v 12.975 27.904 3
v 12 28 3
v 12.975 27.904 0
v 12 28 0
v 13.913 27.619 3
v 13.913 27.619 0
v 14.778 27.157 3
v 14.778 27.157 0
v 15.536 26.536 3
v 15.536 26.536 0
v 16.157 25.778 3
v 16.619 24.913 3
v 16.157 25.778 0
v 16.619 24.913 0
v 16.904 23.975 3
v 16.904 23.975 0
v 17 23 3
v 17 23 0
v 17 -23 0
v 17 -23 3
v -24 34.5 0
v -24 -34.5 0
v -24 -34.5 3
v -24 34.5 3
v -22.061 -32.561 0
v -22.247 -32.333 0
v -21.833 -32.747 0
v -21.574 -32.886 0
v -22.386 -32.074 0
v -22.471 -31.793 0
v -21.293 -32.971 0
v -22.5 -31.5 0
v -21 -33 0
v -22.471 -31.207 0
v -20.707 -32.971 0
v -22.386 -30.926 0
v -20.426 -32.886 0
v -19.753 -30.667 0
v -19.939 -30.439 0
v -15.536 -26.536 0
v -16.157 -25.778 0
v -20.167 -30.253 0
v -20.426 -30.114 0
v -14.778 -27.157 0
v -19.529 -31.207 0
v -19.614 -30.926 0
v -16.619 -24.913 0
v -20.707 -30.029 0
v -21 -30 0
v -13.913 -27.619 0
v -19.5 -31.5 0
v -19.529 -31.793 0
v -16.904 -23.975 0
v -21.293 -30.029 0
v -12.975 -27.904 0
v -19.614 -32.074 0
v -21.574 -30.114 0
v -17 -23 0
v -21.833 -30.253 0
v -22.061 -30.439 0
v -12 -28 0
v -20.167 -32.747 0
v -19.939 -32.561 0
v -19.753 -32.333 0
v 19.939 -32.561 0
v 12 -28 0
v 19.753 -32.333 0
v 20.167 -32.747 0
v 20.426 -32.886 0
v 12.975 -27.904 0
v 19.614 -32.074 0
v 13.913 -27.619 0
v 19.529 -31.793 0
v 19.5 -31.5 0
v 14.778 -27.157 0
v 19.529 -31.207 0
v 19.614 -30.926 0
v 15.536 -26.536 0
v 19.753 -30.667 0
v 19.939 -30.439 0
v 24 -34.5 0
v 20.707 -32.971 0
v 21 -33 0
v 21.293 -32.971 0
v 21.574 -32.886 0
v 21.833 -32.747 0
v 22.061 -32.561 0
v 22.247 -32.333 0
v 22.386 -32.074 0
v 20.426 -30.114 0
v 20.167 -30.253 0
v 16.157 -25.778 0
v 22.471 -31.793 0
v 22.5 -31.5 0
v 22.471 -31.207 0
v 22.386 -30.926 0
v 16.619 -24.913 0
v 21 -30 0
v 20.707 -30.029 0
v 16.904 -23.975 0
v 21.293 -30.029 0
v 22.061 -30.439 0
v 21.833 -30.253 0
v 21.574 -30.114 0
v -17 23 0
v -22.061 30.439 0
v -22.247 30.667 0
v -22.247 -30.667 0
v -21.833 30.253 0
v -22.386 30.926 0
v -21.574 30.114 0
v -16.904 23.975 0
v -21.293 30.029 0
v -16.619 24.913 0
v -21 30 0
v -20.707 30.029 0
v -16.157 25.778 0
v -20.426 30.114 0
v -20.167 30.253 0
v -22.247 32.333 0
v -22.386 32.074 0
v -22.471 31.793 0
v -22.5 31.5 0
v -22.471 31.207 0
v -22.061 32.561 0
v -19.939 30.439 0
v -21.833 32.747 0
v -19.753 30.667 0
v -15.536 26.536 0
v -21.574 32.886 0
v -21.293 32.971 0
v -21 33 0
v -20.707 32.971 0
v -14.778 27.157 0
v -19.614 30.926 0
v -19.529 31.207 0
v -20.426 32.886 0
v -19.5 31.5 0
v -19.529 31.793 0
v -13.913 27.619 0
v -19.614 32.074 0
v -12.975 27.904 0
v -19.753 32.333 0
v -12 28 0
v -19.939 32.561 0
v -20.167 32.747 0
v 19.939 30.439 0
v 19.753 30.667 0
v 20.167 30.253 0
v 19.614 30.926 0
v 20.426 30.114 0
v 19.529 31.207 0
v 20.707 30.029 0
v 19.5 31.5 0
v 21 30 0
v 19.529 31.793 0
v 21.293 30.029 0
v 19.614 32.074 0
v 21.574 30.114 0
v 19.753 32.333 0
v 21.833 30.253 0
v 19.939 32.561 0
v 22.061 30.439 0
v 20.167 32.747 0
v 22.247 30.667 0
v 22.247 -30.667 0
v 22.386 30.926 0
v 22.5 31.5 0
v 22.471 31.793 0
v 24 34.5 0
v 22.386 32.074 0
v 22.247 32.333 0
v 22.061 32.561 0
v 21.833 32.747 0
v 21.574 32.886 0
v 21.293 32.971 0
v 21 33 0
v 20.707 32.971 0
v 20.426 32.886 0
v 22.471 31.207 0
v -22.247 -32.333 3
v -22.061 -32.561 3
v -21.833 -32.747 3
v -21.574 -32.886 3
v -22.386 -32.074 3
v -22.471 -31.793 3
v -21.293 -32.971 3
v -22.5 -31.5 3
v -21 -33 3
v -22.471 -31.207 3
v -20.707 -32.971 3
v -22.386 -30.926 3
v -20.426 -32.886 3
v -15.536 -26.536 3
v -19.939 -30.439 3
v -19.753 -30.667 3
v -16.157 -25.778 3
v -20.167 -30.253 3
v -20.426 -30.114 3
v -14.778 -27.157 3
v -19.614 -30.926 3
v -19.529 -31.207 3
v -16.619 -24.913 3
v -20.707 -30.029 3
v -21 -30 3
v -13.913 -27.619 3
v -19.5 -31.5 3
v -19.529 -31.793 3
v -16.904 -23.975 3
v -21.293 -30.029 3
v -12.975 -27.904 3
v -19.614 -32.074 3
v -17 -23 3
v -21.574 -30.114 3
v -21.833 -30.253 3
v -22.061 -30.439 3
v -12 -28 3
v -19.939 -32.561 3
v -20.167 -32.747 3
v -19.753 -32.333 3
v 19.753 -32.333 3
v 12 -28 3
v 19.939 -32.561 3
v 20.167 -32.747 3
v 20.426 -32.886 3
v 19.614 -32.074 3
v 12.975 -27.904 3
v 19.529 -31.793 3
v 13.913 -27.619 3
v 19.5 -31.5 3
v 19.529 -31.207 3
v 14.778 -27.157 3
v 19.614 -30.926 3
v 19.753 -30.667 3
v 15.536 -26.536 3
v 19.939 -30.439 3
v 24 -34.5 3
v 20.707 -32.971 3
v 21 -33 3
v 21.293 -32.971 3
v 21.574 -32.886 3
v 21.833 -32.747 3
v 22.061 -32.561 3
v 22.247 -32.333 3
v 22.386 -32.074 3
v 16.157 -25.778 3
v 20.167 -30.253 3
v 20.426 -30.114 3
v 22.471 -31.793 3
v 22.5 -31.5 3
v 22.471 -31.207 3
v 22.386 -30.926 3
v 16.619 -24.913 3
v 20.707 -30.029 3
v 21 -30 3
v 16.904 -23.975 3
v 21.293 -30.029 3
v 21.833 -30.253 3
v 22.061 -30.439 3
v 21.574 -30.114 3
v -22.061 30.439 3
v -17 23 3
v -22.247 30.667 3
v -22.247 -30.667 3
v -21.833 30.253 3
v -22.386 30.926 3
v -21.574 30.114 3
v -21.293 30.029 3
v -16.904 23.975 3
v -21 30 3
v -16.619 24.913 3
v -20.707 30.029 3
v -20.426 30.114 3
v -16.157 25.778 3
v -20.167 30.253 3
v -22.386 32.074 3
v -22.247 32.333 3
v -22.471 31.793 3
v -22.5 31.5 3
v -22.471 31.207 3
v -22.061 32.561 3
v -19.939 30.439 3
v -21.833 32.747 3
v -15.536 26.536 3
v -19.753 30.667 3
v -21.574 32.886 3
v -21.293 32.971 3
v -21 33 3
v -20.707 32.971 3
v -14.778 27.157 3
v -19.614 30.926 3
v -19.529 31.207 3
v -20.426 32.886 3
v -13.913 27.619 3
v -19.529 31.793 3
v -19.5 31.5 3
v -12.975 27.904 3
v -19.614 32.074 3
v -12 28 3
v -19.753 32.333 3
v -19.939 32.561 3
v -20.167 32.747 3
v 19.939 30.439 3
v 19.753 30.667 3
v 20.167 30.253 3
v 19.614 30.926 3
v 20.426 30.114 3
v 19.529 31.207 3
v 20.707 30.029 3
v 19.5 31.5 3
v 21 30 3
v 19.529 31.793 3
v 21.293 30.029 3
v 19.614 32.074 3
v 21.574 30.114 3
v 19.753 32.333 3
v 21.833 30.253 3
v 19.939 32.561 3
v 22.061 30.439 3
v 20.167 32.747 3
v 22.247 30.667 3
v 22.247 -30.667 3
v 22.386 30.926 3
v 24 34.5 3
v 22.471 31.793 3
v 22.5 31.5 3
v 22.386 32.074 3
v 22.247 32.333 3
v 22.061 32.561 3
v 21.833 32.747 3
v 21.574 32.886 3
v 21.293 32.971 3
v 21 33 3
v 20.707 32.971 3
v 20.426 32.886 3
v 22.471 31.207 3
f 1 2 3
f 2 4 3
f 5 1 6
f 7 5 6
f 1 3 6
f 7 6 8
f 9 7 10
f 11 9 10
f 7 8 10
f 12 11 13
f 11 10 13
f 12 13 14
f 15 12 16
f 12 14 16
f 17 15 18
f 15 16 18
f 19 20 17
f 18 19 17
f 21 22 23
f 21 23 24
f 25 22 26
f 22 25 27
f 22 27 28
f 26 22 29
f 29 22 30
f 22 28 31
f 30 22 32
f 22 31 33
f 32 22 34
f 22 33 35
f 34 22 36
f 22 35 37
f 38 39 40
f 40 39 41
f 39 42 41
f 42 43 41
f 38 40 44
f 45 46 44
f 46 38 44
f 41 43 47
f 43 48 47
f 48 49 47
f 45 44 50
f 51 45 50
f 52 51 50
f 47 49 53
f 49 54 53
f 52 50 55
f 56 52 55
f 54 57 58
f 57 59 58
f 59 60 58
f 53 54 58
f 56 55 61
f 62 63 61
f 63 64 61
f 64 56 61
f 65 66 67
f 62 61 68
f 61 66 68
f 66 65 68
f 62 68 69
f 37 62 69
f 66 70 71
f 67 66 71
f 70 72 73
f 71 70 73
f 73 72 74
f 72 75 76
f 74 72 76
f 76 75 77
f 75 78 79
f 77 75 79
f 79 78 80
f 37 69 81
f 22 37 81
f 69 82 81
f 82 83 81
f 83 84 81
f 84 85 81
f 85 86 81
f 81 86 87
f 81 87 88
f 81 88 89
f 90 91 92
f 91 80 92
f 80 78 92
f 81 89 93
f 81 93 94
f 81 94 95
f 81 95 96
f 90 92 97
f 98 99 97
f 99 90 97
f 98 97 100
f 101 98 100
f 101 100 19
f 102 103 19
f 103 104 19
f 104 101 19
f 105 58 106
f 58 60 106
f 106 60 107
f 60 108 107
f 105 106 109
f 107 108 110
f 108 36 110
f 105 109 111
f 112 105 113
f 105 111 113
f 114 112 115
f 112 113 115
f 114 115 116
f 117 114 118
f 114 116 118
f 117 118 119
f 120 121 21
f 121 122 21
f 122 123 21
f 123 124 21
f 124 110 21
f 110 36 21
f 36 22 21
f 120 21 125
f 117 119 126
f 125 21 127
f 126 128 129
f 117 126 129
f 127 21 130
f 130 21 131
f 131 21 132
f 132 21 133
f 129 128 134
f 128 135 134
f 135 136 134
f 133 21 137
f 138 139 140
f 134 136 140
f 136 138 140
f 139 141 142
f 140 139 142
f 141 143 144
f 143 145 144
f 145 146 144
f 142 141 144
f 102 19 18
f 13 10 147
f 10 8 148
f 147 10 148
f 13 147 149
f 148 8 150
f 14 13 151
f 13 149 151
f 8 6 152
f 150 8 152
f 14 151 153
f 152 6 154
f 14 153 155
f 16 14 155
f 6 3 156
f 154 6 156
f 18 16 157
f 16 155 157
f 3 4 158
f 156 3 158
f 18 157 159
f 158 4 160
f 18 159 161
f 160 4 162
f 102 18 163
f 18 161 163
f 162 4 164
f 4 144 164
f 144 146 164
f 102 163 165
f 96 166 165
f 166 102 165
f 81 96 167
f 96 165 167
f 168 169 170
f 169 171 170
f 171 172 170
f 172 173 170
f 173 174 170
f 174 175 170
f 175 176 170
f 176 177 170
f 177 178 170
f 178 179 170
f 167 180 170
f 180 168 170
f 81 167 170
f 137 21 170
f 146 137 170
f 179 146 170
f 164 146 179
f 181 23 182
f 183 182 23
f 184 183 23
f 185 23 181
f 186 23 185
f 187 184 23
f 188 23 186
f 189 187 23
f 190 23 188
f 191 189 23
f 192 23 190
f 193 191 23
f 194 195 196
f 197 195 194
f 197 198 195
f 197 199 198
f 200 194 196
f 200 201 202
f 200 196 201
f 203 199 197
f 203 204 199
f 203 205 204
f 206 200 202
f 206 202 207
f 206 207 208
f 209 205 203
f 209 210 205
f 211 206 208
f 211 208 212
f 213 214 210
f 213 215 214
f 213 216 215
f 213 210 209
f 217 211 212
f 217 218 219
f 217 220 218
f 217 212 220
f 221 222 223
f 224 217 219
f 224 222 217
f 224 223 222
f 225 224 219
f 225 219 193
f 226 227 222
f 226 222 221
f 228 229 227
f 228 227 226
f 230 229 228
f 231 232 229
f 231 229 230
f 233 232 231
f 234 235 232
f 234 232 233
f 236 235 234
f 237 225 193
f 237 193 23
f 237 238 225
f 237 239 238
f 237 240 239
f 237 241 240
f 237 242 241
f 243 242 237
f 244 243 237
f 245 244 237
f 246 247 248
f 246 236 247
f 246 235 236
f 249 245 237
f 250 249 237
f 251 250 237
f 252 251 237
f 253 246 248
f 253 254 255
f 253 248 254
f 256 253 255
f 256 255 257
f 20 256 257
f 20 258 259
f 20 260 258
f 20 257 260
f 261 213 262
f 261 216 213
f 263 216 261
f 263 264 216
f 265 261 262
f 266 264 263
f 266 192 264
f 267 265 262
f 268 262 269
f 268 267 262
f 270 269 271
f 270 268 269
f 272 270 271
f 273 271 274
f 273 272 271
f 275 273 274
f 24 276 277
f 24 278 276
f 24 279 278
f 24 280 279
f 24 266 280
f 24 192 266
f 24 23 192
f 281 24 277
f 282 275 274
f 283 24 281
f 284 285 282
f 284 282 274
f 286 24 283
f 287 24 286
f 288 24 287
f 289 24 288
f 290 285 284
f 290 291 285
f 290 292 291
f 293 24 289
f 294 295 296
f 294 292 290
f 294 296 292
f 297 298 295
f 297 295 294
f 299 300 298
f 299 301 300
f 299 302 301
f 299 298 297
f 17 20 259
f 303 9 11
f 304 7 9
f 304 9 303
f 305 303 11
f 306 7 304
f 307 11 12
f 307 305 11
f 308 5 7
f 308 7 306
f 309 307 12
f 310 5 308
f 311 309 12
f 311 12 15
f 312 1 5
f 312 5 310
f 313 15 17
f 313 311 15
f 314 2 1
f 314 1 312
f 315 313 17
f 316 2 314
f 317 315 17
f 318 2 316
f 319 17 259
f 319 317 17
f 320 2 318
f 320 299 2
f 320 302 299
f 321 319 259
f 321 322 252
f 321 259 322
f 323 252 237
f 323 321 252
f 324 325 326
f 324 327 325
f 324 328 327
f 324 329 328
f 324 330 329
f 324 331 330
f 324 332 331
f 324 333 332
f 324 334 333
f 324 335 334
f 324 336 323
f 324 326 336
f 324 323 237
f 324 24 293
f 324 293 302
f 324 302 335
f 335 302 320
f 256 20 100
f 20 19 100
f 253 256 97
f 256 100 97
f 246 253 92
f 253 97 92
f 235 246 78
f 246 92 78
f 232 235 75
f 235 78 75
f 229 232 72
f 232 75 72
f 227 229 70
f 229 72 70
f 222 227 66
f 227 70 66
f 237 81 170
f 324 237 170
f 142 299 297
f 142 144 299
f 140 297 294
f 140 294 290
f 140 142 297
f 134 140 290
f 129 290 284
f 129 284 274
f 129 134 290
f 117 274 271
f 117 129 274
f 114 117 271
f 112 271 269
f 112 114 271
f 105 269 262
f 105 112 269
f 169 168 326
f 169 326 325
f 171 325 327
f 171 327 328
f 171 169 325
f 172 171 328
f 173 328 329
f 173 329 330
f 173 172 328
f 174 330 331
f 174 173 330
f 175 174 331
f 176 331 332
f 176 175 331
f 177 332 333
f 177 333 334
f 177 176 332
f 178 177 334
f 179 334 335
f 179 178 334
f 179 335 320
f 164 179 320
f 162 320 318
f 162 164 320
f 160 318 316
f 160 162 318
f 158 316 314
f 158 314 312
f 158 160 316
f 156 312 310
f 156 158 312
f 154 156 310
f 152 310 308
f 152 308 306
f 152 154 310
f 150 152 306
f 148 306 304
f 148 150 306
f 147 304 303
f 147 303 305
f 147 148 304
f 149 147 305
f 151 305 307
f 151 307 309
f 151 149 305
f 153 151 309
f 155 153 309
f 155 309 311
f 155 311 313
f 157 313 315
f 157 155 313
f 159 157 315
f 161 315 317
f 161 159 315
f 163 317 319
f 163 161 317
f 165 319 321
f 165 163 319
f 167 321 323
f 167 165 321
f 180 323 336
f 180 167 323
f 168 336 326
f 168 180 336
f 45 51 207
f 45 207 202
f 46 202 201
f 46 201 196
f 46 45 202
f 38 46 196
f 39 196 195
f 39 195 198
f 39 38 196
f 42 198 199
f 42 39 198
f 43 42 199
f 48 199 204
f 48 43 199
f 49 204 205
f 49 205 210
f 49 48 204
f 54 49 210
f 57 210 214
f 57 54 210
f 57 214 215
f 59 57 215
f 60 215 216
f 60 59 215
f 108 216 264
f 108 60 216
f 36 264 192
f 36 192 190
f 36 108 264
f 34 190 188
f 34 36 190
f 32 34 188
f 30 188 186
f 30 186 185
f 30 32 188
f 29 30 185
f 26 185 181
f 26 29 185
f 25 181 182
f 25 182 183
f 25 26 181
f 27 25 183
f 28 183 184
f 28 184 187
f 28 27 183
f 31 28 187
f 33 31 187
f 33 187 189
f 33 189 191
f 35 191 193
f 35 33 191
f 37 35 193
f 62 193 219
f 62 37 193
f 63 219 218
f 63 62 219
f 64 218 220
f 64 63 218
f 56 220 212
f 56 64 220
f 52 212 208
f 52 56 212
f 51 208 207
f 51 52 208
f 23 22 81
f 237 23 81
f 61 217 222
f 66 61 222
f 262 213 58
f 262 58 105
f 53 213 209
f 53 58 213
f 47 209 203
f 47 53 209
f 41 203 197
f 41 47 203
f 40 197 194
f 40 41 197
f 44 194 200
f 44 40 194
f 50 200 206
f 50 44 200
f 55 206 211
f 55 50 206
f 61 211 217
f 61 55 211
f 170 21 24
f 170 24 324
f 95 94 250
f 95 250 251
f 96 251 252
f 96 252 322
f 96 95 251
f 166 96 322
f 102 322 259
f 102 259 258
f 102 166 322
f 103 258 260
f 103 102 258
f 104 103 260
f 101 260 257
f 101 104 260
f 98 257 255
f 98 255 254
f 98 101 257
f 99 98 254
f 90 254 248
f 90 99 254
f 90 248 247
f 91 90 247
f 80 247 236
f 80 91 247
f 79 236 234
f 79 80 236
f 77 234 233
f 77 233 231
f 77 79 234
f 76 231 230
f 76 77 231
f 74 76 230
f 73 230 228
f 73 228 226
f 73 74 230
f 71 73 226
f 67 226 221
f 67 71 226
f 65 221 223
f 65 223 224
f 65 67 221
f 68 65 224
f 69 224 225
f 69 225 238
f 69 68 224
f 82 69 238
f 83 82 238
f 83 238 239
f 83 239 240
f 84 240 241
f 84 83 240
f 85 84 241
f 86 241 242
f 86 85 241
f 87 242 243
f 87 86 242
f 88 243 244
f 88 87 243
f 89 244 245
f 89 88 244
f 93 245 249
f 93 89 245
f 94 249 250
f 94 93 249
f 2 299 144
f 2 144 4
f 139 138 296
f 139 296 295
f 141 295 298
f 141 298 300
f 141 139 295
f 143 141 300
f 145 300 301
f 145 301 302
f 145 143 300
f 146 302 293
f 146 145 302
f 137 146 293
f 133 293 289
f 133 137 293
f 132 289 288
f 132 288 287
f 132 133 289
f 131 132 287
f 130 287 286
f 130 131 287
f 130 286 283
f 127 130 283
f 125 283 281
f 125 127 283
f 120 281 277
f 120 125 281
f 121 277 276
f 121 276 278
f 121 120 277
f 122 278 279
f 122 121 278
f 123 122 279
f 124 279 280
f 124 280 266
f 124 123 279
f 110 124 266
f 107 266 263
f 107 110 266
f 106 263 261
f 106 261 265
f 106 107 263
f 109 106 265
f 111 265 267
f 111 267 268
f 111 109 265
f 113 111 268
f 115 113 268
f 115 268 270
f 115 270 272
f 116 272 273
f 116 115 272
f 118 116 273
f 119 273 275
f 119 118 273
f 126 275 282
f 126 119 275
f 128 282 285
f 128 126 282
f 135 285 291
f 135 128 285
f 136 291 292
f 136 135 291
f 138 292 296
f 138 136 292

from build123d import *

# Parameters (mm, degrees)
F0_W     = 48
F0_H     = 69
F0_R     = 1.5
F1_DEPTH = 3
F2_W     = 34
F2_H     = 56
F3_DEPTH = 3
F4_R     = 5
F5_R     = 5


with BuildPart() as f1:
    # F0 (on Top) → F1 (new body)
    with BuildSketch(Plane.XY):
        Rectangle(F0_W, F0_H)
        with Locations((-21, -31.5)):
            Circle(F0_R, mode=Mode.SUBTRACT)
        with Locations((21, -31.5)):
            Circle(F0_R, mode=Mode.SUBTRACT)
        with Locations((-21, 31.5)):
            Circle(F0_R, mode=Mode.SUBTRACT)
        with Locations((21, 31.5)):
            Circle(F0_R, mode=Mode.SUBTRACT)
    extrude(amount=F1_DEPTH)

    # F2 (on face) → F3 (cut, through all)
    with BuildSketch(Plane.XY.offset(3)):
        Rectangle(F2_W, F2_H)
    extrude(amount=-F3_DEPTH, mode=Mode.SUBTRACT)

    # F4
    f4_edges = [f1.edges().sort_by_distance(p)[0] for p in [
        (-17, 28, 1.5),
    ]]
    fillet(f4_edges, radius=F4_R)

    # F5
    f5_edges = [f1.edges().sort_by_distance(p)[0] for p in [
        (-17, -28, 1.5),
        (17, -28, 1.5),
        (17, 28, 1.5),
    ]]
    fillet(f5_edges, radius=F5_R)


solid = f1.part
